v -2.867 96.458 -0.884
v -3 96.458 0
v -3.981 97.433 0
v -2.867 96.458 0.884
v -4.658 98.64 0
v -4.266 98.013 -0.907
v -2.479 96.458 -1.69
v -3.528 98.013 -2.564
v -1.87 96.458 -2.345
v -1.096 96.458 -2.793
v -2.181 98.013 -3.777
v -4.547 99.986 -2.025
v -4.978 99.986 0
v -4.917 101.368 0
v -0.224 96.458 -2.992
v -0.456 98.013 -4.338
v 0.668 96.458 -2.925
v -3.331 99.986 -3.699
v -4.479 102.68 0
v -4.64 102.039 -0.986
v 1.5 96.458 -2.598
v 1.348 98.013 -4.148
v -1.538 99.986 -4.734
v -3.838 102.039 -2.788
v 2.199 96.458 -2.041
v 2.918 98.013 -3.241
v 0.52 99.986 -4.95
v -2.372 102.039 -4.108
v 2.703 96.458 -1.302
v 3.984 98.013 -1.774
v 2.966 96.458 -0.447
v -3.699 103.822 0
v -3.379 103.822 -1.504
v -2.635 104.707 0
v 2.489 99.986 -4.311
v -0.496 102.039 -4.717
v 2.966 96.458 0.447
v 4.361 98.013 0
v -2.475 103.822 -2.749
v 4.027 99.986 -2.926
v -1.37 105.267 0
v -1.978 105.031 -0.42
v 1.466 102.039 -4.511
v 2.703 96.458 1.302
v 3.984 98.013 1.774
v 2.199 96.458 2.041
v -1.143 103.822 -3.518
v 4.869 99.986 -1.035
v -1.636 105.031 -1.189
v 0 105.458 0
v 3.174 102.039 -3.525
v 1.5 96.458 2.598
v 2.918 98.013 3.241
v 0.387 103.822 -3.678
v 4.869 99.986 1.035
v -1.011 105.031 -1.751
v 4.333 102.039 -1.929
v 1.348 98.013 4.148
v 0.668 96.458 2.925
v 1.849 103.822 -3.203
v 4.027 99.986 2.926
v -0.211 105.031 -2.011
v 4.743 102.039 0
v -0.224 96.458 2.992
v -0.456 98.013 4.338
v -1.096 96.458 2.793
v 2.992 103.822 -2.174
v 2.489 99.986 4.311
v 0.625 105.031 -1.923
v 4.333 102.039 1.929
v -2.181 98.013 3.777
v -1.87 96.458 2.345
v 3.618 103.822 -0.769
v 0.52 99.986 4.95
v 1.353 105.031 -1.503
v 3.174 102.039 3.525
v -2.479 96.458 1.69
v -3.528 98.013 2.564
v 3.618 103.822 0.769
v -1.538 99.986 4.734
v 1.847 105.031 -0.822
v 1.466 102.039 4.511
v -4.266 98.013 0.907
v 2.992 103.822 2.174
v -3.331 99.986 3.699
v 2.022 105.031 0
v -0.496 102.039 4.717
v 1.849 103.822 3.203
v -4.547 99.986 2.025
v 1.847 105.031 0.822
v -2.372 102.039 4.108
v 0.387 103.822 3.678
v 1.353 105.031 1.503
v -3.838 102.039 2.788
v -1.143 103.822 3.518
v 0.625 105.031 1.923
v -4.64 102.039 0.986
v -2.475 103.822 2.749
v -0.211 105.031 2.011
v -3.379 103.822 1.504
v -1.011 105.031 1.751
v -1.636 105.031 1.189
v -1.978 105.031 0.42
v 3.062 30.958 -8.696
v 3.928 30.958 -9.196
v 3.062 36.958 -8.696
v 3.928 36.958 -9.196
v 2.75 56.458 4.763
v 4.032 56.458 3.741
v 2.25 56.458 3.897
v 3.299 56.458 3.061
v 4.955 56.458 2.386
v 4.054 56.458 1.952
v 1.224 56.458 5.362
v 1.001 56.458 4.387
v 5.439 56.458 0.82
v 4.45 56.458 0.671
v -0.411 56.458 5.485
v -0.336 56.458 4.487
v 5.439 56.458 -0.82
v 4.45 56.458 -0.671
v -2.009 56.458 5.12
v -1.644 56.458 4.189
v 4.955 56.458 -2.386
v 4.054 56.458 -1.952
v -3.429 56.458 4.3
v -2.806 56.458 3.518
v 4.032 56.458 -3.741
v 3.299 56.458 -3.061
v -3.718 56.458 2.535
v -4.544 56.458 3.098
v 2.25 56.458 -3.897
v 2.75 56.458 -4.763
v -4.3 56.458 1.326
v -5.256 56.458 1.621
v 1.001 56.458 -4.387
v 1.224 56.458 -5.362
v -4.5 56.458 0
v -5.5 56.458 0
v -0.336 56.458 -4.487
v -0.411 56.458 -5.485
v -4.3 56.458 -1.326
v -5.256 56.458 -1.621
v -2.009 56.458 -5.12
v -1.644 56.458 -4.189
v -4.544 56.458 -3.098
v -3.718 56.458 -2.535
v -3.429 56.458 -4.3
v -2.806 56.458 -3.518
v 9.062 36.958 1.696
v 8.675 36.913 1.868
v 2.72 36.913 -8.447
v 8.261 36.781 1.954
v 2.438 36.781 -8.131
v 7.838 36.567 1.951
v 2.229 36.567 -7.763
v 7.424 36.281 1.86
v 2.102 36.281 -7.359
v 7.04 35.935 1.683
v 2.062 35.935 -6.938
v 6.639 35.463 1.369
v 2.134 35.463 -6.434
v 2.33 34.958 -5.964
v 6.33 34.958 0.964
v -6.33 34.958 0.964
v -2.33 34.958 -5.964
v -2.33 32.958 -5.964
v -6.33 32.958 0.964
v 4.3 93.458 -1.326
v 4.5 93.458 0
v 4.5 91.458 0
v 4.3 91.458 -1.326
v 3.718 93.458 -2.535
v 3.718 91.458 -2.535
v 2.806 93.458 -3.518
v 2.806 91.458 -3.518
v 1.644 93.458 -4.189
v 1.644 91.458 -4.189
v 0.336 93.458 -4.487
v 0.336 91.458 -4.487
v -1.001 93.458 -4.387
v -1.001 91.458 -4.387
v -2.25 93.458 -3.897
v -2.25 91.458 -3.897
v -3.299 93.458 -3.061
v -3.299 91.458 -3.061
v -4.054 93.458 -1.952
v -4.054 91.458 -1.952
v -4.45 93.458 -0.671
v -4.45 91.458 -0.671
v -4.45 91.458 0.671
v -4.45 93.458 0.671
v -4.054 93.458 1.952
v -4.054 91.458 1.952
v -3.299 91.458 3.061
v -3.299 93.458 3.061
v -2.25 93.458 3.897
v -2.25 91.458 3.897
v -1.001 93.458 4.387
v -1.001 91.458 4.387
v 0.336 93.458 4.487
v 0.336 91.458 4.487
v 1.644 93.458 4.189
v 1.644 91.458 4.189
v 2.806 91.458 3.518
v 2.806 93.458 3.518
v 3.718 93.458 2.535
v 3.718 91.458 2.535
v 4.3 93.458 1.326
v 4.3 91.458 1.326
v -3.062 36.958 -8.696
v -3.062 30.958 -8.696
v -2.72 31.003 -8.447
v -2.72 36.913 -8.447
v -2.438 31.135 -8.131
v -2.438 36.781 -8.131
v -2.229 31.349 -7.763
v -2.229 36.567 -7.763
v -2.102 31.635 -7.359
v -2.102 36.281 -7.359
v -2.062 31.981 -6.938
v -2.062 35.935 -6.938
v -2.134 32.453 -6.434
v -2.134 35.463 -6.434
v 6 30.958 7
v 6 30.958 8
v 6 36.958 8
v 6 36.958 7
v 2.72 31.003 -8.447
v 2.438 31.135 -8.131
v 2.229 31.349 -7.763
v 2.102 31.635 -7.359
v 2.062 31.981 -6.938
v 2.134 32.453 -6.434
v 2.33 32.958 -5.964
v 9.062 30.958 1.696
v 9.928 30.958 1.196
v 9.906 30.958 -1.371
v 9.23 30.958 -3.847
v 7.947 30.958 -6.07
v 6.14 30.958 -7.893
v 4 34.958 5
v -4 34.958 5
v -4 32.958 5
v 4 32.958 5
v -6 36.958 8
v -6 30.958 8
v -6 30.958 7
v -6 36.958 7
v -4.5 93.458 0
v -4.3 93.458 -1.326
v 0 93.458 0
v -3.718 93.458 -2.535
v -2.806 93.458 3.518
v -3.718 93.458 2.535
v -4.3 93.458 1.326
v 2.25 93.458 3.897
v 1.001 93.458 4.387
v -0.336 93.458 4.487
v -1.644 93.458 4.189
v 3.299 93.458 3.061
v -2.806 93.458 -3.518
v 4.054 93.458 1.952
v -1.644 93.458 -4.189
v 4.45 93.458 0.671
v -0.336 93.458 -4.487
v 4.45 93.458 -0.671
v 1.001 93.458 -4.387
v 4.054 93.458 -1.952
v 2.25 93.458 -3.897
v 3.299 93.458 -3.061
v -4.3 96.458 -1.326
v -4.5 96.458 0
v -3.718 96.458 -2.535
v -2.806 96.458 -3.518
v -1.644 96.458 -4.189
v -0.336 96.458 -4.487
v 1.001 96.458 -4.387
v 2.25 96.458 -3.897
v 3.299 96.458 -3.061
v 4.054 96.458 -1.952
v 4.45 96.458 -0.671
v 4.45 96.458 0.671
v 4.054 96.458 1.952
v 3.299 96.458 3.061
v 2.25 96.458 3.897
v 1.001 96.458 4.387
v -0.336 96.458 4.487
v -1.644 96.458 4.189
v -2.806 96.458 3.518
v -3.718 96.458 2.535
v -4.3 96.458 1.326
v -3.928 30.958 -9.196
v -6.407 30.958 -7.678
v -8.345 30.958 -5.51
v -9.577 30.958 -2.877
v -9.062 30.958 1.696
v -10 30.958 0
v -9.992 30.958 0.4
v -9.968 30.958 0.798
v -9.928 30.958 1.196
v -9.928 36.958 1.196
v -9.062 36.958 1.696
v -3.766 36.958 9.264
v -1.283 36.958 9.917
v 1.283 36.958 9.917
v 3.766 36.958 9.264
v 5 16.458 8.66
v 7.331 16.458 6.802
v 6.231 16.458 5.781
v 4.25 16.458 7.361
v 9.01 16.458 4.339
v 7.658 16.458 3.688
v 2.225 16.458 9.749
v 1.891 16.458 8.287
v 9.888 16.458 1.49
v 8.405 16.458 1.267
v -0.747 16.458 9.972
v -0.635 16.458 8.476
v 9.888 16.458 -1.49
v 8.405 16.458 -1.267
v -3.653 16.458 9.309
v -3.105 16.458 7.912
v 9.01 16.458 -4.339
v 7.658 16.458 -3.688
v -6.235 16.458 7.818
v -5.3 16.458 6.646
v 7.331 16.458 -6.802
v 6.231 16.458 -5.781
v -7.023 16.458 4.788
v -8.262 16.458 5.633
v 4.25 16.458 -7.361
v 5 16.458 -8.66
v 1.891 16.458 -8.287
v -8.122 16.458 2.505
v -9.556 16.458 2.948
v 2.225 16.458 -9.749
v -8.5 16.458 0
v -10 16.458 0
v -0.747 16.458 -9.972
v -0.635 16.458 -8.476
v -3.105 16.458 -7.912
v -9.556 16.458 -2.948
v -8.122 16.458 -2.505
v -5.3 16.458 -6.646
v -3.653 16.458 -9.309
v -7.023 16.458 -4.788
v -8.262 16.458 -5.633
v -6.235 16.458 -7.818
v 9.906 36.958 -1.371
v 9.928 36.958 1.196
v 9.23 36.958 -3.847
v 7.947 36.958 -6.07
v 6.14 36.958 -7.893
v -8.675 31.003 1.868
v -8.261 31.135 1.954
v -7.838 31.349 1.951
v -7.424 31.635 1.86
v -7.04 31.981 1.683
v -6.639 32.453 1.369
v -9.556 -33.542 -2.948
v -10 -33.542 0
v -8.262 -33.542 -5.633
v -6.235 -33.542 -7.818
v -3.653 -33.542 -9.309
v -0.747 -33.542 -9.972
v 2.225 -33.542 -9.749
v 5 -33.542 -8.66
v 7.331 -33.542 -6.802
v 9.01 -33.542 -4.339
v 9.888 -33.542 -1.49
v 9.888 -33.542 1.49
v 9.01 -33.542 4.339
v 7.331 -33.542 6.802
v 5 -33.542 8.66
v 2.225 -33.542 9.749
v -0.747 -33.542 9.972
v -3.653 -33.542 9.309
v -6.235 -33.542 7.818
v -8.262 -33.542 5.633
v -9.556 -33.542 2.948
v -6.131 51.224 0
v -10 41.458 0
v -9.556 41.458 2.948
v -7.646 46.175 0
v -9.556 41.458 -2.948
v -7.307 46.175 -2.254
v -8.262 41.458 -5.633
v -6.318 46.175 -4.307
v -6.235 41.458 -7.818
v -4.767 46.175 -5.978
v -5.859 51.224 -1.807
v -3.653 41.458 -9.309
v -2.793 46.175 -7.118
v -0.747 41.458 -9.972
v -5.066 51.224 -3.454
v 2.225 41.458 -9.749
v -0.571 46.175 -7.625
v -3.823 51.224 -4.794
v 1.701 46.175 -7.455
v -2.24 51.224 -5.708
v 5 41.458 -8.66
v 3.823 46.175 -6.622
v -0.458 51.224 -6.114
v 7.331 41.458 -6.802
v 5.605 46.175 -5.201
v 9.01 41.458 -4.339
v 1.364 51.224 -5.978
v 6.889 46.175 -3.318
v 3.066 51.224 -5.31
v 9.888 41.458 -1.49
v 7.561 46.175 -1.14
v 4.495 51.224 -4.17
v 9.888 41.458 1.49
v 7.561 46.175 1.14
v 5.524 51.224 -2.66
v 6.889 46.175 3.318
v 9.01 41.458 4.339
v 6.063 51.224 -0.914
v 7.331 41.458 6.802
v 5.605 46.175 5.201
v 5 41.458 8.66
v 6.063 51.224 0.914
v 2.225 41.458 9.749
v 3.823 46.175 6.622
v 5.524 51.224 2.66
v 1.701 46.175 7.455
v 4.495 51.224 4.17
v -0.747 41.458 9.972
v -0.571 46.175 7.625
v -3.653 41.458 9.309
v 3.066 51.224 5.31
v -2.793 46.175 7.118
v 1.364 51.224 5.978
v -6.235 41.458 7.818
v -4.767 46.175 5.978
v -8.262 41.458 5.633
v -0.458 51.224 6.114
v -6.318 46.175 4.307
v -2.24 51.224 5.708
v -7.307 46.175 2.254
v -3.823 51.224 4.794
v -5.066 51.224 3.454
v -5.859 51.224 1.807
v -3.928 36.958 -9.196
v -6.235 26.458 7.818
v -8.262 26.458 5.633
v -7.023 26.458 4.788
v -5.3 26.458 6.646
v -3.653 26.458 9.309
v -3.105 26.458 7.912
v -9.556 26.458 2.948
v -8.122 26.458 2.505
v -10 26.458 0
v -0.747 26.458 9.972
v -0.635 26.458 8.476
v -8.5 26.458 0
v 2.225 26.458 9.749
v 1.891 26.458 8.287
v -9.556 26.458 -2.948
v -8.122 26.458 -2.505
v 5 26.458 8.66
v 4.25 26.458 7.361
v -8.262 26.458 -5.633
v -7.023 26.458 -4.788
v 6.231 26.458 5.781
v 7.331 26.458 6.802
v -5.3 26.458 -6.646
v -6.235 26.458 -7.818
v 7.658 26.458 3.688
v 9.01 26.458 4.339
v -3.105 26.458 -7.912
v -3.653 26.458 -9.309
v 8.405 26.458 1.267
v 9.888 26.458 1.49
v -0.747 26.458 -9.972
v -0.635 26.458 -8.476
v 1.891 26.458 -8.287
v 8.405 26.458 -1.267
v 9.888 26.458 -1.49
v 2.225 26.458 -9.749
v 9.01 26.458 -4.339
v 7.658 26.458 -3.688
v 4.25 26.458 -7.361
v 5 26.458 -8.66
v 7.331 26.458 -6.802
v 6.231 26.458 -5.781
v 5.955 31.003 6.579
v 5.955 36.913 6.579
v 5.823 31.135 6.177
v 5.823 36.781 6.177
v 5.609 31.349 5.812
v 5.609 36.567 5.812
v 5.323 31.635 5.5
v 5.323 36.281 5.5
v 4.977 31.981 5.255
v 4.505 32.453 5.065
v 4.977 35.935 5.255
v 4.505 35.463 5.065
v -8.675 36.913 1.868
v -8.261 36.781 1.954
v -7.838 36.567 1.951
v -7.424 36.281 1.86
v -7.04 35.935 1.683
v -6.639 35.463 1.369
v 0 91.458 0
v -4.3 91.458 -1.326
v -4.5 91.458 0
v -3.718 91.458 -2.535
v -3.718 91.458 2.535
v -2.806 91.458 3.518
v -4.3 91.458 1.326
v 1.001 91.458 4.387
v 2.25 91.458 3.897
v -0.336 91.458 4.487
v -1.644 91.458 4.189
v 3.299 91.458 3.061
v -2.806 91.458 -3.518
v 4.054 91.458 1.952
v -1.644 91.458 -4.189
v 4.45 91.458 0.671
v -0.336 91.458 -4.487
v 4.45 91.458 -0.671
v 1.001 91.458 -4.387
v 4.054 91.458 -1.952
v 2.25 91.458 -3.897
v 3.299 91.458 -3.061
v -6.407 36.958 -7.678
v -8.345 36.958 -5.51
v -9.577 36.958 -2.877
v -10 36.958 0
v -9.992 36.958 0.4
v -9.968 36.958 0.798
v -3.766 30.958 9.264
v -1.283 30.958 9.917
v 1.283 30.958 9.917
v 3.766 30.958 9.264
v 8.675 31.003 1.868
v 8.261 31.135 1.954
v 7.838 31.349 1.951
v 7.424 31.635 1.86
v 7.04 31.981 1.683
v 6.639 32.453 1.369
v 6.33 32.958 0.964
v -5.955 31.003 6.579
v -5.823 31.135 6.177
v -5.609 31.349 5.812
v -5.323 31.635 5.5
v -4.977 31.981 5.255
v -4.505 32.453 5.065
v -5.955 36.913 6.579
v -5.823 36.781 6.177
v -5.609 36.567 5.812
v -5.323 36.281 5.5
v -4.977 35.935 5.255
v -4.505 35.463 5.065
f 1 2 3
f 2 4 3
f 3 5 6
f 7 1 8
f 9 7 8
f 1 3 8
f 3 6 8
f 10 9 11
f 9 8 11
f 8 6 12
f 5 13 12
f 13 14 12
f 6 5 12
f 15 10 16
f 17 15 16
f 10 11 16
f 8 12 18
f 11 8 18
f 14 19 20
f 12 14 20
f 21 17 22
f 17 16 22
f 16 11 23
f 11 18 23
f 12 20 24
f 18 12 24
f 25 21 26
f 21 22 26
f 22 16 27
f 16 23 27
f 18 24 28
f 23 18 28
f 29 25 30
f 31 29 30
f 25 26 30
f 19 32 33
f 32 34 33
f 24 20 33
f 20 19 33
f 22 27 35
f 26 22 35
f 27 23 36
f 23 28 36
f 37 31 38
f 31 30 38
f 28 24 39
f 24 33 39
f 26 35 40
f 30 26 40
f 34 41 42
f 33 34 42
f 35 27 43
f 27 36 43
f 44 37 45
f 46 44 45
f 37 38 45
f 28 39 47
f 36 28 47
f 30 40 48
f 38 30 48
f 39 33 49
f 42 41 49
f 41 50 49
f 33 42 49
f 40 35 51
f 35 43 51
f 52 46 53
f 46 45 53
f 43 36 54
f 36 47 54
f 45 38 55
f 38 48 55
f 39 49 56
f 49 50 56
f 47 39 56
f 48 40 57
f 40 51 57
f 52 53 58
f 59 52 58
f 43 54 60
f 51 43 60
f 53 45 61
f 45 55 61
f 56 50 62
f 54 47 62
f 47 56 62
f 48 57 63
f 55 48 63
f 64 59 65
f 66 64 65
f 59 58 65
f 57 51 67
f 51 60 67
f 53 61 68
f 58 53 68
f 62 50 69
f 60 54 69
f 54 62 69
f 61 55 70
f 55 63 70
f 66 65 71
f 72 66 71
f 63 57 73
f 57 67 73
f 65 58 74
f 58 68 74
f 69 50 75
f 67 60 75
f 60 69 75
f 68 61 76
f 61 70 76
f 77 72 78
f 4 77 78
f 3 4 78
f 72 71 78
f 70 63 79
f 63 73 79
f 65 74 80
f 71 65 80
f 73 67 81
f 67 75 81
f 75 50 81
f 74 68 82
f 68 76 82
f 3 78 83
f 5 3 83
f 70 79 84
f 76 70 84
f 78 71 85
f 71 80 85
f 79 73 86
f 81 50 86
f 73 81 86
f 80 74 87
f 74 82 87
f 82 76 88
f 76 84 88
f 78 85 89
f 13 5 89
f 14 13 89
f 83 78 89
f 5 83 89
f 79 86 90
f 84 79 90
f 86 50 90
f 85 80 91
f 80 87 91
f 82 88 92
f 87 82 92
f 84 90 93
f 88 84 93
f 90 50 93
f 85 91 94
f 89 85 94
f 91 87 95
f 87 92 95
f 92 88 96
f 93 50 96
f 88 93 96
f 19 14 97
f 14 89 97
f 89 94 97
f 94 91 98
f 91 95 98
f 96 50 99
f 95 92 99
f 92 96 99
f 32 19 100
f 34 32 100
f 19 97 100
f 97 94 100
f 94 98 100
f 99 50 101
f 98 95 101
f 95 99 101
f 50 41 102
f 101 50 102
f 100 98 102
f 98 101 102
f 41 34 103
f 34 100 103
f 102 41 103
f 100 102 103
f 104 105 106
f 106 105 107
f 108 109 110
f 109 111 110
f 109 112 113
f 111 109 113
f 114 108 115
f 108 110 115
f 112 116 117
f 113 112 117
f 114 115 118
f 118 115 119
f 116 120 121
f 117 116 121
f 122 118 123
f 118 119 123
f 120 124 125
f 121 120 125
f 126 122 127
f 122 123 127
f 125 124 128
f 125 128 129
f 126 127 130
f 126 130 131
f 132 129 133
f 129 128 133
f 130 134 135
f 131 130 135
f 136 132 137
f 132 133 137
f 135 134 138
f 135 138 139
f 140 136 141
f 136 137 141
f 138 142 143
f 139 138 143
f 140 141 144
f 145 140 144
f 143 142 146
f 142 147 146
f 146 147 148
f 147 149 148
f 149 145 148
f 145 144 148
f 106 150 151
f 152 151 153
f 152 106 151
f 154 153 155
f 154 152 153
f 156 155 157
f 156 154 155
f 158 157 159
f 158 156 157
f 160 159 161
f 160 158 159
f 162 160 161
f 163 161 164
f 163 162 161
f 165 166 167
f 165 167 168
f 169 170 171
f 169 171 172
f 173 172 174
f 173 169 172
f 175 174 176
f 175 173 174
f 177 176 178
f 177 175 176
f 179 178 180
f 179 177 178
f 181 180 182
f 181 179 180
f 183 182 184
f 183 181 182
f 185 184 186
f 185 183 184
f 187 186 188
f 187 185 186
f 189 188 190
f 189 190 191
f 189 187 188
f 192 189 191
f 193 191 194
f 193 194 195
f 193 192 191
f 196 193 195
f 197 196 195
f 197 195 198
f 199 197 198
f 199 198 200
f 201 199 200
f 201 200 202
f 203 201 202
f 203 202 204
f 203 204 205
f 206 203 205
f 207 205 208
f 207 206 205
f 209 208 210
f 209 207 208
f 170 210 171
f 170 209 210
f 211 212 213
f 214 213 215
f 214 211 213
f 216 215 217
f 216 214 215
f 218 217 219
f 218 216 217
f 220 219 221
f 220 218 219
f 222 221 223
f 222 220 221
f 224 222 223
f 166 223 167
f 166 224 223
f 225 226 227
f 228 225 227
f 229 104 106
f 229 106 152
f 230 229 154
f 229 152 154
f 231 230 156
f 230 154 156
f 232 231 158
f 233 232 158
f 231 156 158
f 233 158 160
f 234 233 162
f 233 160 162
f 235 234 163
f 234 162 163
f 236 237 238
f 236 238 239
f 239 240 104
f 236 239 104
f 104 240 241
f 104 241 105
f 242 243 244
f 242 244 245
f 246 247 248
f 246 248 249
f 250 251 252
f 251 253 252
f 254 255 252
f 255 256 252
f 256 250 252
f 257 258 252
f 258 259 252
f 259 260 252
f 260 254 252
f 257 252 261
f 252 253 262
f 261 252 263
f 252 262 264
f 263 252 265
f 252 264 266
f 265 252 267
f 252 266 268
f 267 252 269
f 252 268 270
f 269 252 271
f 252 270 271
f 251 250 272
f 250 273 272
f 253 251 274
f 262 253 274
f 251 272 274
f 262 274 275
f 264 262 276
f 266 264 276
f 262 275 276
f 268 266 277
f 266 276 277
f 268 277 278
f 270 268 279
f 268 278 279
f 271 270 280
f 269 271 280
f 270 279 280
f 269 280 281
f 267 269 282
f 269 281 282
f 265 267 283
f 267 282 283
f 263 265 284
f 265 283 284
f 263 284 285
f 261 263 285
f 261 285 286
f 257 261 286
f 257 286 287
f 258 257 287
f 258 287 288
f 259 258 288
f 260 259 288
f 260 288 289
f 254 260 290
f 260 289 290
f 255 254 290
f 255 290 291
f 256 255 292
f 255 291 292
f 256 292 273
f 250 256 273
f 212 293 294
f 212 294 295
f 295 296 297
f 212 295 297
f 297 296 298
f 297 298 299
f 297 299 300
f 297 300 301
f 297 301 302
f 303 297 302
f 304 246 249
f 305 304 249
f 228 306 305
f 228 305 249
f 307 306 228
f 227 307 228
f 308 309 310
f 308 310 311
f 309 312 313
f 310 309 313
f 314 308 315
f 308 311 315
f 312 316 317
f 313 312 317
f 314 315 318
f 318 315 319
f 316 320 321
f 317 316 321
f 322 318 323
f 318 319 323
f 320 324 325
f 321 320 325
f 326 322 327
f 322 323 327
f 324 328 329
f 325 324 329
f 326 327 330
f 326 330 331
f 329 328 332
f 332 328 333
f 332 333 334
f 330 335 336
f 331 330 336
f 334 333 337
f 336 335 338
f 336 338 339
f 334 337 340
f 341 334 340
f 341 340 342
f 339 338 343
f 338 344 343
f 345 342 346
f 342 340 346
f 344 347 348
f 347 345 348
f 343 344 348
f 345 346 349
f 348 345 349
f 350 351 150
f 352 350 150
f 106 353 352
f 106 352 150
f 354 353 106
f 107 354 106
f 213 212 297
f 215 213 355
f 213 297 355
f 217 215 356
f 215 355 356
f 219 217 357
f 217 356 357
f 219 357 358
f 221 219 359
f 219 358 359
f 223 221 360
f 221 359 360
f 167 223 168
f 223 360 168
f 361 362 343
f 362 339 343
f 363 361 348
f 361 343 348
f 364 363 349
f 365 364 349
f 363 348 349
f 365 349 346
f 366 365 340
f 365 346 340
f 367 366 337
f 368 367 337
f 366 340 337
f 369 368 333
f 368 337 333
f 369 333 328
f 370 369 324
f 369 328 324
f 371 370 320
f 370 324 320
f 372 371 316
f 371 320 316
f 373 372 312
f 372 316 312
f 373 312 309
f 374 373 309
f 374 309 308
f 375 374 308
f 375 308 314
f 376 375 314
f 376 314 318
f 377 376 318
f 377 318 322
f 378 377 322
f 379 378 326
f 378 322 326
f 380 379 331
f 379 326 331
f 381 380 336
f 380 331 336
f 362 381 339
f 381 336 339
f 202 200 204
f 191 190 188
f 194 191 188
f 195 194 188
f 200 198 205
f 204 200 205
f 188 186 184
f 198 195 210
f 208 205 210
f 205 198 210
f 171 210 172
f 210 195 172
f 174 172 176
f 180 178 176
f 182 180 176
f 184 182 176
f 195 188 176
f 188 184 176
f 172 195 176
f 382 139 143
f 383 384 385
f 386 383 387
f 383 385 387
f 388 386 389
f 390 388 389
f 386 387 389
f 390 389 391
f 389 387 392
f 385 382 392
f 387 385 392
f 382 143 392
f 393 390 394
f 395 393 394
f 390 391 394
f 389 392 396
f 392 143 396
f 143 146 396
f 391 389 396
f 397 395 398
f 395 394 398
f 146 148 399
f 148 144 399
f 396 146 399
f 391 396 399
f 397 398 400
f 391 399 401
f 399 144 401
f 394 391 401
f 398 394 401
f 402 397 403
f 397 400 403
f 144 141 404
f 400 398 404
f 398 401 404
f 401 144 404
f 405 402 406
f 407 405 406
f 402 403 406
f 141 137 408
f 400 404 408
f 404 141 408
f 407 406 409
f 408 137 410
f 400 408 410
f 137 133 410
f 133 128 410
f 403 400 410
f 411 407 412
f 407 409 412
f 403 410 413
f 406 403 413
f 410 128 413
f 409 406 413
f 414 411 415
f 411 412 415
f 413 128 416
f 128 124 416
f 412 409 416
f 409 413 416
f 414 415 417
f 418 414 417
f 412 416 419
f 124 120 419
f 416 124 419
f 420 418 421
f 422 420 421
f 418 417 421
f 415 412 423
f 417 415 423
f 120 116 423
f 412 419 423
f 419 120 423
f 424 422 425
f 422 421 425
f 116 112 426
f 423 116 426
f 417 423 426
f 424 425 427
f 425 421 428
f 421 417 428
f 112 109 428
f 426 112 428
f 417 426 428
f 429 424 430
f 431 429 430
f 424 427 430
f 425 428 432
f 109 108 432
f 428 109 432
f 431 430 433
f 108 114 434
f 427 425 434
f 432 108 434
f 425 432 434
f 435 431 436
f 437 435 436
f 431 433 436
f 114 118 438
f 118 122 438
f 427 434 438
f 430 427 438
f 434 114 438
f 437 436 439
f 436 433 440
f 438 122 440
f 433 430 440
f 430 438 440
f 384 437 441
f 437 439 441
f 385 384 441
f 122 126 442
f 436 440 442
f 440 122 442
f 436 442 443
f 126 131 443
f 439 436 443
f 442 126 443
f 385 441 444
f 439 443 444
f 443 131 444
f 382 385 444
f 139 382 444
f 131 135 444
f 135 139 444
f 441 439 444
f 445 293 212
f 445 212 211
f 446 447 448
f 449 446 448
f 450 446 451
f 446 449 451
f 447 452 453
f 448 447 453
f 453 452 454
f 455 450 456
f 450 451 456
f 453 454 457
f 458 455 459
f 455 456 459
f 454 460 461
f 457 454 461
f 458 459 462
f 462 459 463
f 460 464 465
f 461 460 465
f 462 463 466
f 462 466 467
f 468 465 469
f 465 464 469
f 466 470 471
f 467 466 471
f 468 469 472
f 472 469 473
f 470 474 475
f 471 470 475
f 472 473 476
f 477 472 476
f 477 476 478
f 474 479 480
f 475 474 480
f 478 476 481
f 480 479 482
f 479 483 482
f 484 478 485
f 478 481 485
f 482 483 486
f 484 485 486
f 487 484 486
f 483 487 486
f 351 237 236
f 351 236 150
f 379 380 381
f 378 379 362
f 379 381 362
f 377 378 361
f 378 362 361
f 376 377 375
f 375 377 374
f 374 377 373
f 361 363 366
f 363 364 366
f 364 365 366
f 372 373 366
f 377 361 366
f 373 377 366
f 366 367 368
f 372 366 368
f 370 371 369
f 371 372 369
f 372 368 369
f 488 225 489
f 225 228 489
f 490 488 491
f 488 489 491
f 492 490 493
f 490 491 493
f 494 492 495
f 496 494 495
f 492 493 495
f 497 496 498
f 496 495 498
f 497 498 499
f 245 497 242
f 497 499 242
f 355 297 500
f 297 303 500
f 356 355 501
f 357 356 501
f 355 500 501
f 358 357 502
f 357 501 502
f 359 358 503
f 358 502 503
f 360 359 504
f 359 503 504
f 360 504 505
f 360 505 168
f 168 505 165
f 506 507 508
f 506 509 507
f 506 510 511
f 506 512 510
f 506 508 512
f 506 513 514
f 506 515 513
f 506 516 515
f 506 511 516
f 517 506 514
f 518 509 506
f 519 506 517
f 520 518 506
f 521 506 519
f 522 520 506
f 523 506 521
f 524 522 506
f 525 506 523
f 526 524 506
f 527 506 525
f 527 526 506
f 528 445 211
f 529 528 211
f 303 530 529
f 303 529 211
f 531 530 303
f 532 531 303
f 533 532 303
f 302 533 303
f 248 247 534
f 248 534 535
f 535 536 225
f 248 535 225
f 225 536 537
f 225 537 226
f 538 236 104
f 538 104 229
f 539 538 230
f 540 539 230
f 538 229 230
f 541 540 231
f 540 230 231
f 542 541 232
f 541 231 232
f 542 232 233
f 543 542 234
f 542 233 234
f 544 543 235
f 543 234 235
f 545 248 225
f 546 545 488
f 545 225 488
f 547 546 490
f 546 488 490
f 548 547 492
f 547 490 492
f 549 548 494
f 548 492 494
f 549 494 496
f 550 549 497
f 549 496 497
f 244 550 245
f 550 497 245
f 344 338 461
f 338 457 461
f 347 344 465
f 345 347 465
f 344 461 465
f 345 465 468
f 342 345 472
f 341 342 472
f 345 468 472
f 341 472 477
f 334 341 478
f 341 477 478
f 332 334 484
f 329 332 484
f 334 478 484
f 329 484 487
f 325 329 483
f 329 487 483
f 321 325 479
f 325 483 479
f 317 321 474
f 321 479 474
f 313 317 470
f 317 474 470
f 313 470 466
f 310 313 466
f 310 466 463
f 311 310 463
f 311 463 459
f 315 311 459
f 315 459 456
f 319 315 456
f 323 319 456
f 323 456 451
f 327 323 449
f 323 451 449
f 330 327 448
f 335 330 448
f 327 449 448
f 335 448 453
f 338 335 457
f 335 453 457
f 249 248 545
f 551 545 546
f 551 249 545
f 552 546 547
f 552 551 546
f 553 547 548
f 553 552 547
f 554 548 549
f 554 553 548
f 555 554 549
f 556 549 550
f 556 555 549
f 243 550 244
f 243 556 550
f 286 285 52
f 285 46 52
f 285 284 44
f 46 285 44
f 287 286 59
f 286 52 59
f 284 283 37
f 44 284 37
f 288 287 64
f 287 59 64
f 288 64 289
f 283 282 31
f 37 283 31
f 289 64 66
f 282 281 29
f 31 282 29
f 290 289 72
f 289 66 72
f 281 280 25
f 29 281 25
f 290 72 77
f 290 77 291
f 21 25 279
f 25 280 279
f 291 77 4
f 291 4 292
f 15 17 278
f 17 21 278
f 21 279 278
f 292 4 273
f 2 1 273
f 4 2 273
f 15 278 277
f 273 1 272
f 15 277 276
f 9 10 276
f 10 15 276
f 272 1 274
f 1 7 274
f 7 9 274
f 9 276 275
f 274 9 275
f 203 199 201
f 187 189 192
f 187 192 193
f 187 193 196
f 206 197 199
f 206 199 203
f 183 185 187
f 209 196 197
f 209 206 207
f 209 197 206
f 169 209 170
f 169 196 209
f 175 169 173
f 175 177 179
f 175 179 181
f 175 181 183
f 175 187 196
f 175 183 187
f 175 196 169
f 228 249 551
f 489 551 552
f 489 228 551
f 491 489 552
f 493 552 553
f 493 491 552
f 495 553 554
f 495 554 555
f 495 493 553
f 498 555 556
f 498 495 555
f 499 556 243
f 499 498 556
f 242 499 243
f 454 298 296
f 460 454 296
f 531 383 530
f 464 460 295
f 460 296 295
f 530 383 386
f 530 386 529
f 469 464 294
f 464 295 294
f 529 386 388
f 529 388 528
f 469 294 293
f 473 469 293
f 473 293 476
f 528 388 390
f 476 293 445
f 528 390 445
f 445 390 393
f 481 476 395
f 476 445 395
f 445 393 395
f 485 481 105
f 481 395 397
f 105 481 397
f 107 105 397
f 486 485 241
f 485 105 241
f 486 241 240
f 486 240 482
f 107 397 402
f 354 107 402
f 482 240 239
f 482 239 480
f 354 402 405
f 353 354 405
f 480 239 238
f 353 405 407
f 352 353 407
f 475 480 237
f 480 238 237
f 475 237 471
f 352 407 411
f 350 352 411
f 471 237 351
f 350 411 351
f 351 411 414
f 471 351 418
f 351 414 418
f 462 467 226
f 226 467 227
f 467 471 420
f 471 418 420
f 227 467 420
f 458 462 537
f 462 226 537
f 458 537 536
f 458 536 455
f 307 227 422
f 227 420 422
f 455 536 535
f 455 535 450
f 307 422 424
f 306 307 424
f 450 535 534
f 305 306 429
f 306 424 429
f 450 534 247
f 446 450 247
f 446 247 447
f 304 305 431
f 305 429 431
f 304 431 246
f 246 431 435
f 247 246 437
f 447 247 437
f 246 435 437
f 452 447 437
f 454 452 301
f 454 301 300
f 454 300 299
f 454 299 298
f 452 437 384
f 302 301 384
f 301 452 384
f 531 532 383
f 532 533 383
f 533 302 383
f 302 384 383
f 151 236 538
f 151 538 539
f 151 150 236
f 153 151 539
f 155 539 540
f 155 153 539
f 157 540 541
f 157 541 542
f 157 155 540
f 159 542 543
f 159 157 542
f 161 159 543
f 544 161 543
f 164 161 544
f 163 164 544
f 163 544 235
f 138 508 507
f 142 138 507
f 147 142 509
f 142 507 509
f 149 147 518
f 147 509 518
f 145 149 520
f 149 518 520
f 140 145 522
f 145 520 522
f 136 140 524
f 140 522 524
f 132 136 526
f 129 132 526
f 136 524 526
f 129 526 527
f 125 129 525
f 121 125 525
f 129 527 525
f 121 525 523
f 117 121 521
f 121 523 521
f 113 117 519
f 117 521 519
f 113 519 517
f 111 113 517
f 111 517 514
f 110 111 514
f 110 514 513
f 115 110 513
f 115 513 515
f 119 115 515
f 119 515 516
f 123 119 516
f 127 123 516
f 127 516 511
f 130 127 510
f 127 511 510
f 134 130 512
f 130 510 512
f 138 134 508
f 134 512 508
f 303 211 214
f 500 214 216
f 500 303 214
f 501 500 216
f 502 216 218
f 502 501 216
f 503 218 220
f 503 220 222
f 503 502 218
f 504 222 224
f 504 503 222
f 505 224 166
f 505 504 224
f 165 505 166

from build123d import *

# Parameters (mm, degrees)
SKETCH_3_W                       = 12
SKETCH_3_H                       = 6
CUT_EXTRUDE_1_DEPTH              = 19
FILLET_1_R                       = 2
PATTERN_CIRCULAR_1_COUNT         = 3
FILLET_1_OF_PATTERN_CIRCULAR_1_R = 2
SKETCH_6_R                       = 4.5
SKETCH_6_R_2                     = 0.0005
CUT_EXTRUDE_5_DEPTH              = 2
SKETCH_7_R                       = 4.5
EXTRUDE_3_DEPTH                  = 2


with BuildPart() as part:
    # 草图1 → 旋转1 (revolve)
    with BuildSketch(Plane.XY):
        with BuildLine():
            Line((-4.5, 96.457967635), (-3, 96.457967635))
            ThreePointArc((-3, 96.457967635), (-4.74341649, 102.039106465), (0, 105.457967635))
            Line((0, 105.457967635), (0, -33.542032365))
            Line((0, -33.542032365), (-10, -33.542032365))
            Line((-10, -33.542032365), (-10, 16.457967635))
            Line((-10, 16.457967635), (-8.5, 16.457967635))
            Line((-8.5, 16.457967635), (-8.5, 26.457967635))
            Line((-8.5, 26.457967635), (-10, 26.457967635))
            Line((-10, 26.457967635), (-10, 41.457967635))
            ThreePointArc((-10, 41.457967635), (-6.780641664, 48.667160134), (-5.5, 56.457967635))
            Line((-5.5, 56.457967635), (-4.5, 56.457967635))
            Line((-4.5, 56.457967635), (-4.5, 96.457967635))
        make_face()
    revolve(axis=Axis((0, 64.032798659, 0), (0, -1, 0)))

    # 草图3 → 切除-拉伸1 (cut)
    with BuildSketch(Plane.XY.offset(24)):
        with Locations((0, 33.957967635)):
            Rectangle(SKETCH_3_W, SKETCH_3_H)
    cut_extrude_1 = extrude(amount=-CUT_EXTRUDE_1_DEPTH, mode=Mode.SUBTRACT)

    # 圆角1
    fillet_1_edges = [part.edges().sort_by_distance(p)[0] for p in [
        (6, 33.957967635, 5),
        (0, 30.957967635, 5),
        (-6, 33.957967635, 5),
        (0, 36.957967635, 5),
    ]]
    fillet(fillet_1_edges, radius=FILLET_1_R)

    # 阵列(圆周)1: 切除-拉伸1 ×3 about axis
    pattern_circular_1_axis = Axis((0, 0, 0), (0, 1, 0))
    for i in range(1, PATTERN_CIRCULAR_1_COUNT):
        add(cut_extrude_1.rotate(pattern_circular_1_axis, i * 360 / PATTERN_CIRCULAR_1_COUNT), mode=Mode.SUBTRACT)

    # 圆角1 of 阵列(圆周)1
    fillet_1_of_pattern_circular_1_edges = [part.edges().sort_by_distance(p)[0] for p in [
        (1.330127019, 33.957967635, -7.696152423),
        (4.330127019, 30.957967635, -2.5),
        (7.330127019, 33.957967635, 2.696152423),
        (4.330127019, 36.957967635, -2.5),
        (-7.330127019, 33.957967635, 2.696152423),
        (-4.330127019, 30.957967635, -2.5),
        (-1.330127019, 33.957967635, -7.696152423),
        (-4.330127019, 36.957967635, -2.5),
    ]]
    fillet(fillet_1_of_pattern_circular_1_edges, radius=FILLET_1_OF_PATTERN_CIRCULAR_1_R)

    # 草图6 → 切除-拉伸5 (cut)
    with BuildSketch(Plane(origin=(0, 93.457967635, 0), x_dir=(1, 0, 0), z_dir=(0, 1, 0))):
        Circle(SKETCH_6_R)
        Circle(SKETCH_6_R_2, mode=Mode.SUBTRACT)
    extrude(amount=-CUT_EXTRUDE_5_DEPTH, mode=Mode.SUBTRACT)


with BuildPart() as body_2:
    # 草图7 → 凸台-拉伸3 (new body)
    with BuildSketch(Plane(origin=(0, 93.457967635, 0), x_dir=(1, 0, 0), z_dir=(0, 1, 0))):
        Circle(SKETCH_7_R)
    extrude(amount=-EXTRUDE_3_DEPTH)


solid = Compound([part.part, body_2.part])
